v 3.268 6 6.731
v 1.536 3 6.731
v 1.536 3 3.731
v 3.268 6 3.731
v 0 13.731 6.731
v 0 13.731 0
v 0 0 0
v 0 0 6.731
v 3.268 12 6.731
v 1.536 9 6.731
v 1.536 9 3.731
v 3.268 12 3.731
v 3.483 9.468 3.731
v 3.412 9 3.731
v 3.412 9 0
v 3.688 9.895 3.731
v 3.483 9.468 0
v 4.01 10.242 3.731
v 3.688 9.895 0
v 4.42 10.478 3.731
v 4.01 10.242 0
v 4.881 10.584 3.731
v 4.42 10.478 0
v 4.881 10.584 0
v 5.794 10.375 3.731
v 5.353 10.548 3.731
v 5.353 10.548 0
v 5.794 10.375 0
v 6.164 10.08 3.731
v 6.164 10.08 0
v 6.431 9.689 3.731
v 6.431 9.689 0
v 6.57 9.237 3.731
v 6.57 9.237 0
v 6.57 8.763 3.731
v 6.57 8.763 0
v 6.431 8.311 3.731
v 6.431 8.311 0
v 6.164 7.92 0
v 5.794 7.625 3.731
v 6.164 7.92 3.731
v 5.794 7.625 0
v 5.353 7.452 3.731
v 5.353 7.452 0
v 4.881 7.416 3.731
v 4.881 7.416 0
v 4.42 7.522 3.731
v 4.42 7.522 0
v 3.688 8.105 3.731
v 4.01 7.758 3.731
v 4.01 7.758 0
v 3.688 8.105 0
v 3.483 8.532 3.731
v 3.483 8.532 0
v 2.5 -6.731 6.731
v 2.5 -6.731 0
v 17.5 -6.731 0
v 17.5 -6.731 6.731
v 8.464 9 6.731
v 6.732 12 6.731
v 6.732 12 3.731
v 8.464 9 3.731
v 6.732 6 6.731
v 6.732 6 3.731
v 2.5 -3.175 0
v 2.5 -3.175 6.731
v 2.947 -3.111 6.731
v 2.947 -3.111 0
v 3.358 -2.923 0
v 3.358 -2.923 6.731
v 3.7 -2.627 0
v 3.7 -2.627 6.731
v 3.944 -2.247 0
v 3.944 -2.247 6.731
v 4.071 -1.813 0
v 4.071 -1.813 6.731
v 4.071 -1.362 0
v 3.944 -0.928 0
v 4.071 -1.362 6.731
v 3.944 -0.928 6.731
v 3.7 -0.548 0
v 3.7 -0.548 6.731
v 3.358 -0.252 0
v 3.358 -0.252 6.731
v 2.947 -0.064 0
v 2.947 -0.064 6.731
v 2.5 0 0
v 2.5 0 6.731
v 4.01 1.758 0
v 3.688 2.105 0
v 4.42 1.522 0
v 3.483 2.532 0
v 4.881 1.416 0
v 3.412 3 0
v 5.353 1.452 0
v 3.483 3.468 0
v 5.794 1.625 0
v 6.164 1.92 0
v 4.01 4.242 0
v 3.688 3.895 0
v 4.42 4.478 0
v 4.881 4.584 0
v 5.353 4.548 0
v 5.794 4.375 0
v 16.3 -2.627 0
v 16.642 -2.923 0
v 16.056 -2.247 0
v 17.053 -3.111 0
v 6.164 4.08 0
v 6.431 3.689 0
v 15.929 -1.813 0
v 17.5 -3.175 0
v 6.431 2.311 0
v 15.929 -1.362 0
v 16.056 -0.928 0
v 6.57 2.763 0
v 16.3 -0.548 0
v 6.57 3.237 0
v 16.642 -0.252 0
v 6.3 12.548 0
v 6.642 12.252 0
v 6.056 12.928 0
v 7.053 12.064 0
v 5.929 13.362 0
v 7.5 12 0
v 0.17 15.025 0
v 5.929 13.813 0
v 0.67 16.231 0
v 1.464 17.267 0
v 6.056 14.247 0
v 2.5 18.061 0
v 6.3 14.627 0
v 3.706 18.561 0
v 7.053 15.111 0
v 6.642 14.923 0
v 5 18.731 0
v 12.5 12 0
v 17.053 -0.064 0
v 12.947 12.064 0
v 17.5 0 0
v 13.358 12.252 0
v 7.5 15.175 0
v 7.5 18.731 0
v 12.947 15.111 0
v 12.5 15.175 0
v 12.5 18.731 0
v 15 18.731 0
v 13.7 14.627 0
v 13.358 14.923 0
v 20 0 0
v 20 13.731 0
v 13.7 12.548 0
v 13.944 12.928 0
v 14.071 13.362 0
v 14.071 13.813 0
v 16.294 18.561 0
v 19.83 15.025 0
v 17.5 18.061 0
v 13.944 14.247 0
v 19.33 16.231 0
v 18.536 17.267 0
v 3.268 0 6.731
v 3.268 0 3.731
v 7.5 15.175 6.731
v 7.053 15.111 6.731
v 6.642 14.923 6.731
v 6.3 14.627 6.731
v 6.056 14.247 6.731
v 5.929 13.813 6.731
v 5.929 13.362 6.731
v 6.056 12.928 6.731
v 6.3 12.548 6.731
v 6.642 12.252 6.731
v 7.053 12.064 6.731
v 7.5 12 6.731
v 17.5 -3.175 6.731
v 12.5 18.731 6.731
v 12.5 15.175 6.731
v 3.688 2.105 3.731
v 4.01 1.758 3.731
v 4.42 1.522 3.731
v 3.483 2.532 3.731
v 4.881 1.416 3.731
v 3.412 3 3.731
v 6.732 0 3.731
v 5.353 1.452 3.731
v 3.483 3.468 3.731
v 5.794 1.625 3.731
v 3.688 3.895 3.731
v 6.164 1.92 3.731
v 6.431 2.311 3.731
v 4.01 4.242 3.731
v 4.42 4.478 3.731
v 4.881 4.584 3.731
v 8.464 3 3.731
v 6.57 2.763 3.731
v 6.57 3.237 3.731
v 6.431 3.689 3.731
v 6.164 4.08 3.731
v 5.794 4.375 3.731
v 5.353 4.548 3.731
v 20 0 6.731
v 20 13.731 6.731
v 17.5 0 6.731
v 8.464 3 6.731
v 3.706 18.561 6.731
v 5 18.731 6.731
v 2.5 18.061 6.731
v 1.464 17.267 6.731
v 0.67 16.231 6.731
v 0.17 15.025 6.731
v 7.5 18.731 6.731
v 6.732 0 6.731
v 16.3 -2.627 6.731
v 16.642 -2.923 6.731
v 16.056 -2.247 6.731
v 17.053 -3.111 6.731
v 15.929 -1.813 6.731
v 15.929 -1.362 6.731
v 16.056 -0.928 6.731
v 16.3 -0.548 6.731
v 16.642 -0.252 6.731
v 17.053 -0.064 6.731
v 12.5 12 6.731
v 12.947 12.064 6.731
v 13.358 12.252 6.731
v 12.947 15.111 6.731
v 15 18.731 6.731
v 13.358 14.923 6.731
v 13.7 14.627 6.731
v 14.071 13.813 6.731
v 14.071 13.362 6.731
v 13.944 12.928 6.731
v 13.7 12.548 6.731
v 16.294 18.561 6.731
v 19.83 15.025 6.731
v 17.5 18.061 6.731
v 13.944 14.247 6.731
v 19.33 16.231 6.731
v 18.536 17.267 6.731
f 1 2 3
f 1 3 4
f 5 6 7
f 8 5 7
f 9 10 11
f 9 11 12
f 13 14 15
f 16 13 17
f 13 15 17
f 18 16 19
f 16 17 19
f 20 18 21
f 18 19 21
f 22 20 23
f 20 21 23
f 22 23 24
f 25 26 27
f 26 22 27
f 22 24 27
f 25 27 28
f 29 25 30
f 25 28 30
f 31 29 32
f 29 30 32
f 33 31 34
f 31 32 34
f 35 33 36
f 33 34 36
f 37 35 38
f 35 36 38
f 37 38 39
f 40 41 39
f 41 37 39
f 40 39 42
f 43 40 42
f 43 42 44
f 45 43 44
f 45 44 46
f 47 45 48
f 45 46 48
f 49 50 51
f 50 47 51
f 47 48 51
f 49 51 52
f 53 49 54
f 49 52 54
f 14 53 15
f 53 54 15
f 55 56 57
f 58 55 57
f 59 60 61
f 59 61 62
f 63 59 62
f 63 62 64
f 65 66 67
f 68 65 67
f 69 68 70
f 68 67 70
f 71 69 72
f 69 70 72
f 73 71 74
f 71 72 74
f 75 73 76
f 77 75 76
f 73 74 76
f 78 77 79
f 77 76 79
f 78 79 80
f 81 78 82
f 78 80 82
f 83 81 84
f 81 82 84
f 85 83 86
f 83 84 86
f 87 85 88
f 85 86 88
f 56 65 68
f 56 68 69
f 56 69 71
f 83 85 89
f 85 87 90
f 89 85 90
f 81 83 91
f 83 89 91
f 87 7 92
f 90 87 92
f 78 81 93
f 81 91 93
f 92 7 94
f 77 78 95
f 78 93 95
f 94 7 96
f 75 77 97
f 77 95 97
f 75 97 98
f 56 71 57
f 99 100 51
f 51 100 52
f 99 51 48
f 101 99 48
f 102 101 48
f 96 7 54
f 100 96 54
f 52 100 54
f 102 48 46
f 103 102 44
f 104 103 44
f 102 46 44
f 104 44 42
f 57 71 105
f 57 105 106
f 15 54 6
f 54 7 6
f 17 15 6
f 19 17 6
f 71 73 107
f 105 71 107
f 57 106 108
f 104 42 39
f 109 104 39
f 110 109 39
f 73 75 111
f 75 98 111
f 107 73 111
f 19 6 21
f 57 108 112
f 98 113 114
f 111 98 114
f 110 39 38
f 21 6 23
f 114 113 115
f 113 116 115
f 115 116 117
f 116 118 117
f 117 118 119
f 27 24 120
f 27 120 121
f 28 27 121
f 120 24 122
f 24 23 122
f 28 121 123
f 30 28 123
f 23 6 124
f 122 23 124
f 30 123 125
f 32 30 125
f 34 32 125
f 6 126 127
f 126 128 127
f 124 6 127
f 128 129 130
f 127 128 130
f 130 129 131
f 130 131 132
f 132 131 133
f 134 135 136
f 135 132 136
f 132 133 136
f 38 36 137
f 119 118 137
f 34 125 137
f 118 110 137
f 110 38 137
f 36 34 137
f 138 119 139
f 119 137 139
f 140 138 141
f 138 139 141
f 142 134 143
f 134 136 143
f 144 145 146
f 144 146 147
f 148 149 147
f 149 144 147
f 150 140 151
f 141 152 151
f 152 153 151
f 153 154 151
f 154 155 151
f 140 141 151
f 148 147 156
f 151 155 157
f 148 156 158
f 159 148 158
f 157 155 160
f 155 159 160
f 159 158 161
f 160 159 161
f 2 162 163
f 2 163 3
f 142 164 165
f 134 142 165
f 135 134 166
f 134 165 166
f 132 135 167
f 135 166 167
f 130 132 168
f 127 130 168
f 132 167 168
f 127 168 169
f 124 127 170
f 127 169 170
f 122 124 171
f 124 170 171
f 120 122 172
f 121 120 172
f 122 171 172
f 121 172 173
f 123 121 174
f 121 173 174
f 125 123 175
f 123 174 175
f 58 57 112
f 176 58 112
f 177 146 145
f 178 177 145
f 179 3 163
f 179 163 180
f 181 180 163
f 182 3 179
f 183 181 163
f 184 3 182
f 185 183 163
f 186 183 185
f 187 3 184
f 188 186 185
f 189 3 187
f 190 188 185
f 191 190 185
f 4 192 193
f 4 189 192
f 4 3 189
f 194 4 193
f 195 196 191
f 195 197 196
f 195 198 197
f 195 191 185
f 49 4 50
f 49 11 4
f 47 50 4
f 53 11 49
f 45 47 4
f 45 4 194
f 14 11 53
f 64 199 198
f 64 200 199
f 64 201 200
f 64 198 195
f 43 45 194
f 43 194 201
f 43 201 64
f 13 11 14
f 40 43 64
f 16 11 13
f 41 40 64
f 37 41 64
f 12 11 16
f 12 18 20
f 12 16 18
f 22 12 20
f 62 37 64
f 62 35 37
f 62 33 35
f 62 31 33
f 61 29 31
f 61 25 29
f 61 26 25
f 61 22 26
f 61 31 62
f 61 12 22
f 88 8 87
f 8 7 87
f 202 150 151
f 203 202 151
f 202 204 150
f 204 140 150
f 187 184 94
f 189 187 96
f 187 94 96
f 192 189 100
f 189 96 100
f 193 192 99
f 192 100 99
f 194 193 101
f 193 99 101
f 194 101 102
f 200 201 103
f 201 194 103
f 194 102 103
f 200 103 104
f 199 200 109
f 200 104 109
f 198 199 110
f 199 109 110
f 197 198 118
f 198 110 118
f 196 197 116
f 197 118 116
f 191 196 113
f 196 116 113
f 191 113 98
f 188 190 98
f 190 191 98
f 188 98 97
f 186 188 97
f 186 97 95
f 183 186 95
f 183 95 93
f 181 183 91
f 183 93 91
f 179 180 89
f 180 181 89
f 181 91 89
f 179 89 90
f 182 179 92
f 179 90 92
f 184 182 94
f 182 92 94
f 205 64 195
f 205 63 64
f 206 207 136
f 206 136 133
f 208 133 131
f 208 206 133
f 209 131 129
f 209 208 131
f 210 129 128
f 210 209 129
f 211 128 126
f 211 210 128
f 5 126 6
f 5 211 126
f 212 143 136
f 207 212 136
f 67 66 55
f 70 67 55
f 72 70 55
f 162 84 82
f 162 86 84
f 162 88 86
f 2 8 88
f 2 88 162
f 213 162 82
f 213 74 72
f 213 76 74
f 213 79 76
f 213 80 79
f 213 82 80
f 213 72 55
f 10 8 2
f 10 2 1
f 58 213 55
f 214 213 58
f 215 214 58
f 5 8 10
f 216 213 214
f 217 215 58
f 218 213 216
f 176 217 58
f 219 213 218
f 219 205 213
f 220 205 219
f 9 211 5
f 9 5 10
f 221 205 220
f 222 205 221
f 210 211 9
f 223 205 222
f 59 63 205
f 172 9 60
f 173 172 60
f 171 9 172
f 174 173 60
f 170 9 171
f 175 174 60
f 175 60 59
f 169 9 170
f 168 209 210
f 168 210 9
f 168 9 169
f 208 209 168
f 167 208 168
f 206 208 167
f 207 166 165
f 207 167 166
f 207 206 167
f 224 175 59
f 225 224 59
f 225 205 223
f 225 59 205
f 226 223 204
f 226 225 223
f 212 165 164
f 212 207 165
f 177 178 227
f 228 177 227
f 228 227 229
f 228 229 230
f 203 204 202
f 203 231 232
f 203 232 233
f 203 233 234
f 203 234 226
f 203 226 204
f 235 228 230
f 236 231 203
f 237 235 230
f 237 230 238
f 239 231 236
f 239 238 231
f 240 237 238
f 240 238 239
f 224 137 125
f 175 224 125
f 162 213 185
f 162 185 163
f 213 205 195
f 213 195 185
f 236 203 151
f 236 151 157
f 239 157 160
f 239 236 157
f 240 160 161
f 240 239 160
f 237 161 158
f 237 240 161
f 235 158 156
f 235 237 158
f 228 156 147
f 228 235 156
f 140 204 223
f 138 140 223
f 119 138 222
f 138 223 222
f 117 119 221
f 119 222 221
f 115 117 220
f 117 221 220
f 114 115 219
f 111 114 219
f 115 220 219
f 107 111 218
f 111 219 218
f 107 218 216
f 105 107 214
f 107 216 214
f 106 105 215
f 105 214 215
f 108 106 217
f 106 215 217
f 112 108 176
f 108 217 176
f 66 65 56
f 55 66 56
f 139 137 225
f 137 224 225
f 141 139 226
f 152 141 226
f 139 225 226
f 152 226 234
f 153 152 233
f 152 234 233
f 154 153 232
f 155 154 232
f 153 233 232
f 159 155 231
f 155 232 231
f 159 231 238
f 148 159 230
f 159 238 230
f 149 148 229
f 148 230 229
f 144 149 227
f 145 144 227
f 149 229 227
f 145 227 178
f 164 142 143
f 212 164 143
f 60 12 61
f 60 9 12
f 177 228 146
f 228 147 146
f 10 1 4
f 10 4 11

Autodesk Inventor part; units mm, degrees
ref_plane "YZ Plane" through (0, 0, 0) normal (1, 0, 0) x (0, 1, 0)
ref_plane "XZ Plane" through (0, 0, 0) normal (0, 1, 0) x (-1, 0, 0)
ref_plane "XY Plane" through (0, 0, 0) normal (0, 0, 1) x (1, 0, 0)
sketch "Sketch1" plane through (0, 0, 0) normal (0, 0, 1) x (1, 0, 0)
  line L0 (0, 0) -> (2.5, 0)
  line L1 (2.5, 0) -> (2.5, -6.731)
  line L2 (2.5, -6.731) -> (17.5, -6.731)
  line L3 (17.5, -6.731) -> (17.5, 0)
  line L4 (17.5, 0) -> (20, 0)
  line L5 (20, 0) -> (20, 18.731)
  line L6 (20, 18.731) -> (12.5, 18.731)
  line L7 (12.5, 18.731) -> (12.5, 12)
  line L8 (12.5, 12) -> (7.5, 12)
  line L9 (7.5, 12) -> (7.5, 18.731)
  line L10 (7.5, 18.731) -> (0, 18.731)
  line L11 (0, 18.731) -> (0, 0)
  dimension "d0" = 15
  dimension "d1" = 20
  dimension "d3" = 6.731
  dimension "d4" = 5
  dimension "d5" = 12
extrude "Extrusion1" add sketch "Sketch1" along normal blind 6.731
sketch "Sketch2" plane through (0, 0, 0) normal (0, 0, -1) x (-1, 0, 0)
  line L0 (0, 0) -> (-2.5, 0) projected
  circle A0 centre (-5, 3) radius 1.588
  circle A1 centre (-5, 9) radius 1.588
  line L1 (-12.5, 12) -> (-7.5, 12) projected
  line L2 (-2.5, 0) -> (-2.5, -6.731) projected
  line L3 (-10, 12) -> (-10, 9.3655) construction
  dimension "d8" = 6
  dimension "d9" = 3.176
  dimension "d10" = 3
  dimension "d22" = 5
extrude "Extrusion2" cut sketch "Sketch2" against normal up to next
fillet "Fillet1" radius 5 2 edges at (0, 18.731, 3.3655) (20, 18.731, 3.3655)
sketch "Sketch3" plane through (0, 0, 6.731) normal (0, 0, 1) x (1, 0, 0)
  circle A0 centre (5, 3) radius 1.588 projected
  circle A1 centre (5, 9) radius 1.588 projected
  line L0 (8.4641, 9) -> (6.7321, 6)
  line L1 (6.7321, 6) -> (3.2679, 6)
  line L2 (3.2679, 6) -> (1.5359, 9)
  line L3 (1.5359, 9) -> (3.2679, 12)
  line L4 (3.2679, 12) -> (6.7321, 12)
  line L5 (6.7321, 12) -> (8.4641, 9)
  line L6 (8.4641, 3) -> (6.7321, 0)
  line L7 (6.7321, 0) -> (3.2679, 0)
  line L8 (3.2679, 0) -> (1.5359, 3)
  line L9 (1.5359, 3) -> (3.2679, 6)
  line L10 (3.2679, 6) -> (6.7321, 6)
  line L11 (6.7321, 6) -> (8.4641, 3)
  dimension "d14" = 6
extrude "Extrusion3" cut sketch "Sketch3" against normal blind 3
sketch "Sketch4" plane through (0, 0, 6.731) normal (0, 0, 1) x (1, 0, 0)
  circle A0 centre (7.5, 13.5875) radius 1.5875
  circle A1 centre (12.5, 13.5875) radius 1.5875
  line L0 (12.5, 18.731) -> (12.5, 12) projected
  line L1 (0, 0) -> (2.5, 0) projected
  line L2 (2.5, 0) -> (2.5, -6.731) projected
  line L3 (17.5, -6.731) -> (17.5, 0) projected
  line L4 (17.5, 0) -> (20, 0) projected
  arc A2 (2.5, -3.175) -> (2.5, 0) centre (2.5, -1.5875) ccw
  arc A3 (17.5, 0) -> (17.5, -3.175) centre (17.5, -1.5875) ccw
  dimension "d17" = 3.175
extrude "Extrusion4" cut sketch "Sketch4" against normal up to next
equation "\"d3\" = THICKB"
equation "\"d6\" = THICKB"
equation "\"THICKA\" = 3.175"
equation "\"THICKB\" = 6.731"
equation "\"THICKC\" = 12.7"
equation "\"THICKPLY\" = 5"
equation "\"MAGDIA\" = 9.5"
equation "\"BALLDIA\" = 12"
properties part number "Carriage_Joint_Boltblock"
